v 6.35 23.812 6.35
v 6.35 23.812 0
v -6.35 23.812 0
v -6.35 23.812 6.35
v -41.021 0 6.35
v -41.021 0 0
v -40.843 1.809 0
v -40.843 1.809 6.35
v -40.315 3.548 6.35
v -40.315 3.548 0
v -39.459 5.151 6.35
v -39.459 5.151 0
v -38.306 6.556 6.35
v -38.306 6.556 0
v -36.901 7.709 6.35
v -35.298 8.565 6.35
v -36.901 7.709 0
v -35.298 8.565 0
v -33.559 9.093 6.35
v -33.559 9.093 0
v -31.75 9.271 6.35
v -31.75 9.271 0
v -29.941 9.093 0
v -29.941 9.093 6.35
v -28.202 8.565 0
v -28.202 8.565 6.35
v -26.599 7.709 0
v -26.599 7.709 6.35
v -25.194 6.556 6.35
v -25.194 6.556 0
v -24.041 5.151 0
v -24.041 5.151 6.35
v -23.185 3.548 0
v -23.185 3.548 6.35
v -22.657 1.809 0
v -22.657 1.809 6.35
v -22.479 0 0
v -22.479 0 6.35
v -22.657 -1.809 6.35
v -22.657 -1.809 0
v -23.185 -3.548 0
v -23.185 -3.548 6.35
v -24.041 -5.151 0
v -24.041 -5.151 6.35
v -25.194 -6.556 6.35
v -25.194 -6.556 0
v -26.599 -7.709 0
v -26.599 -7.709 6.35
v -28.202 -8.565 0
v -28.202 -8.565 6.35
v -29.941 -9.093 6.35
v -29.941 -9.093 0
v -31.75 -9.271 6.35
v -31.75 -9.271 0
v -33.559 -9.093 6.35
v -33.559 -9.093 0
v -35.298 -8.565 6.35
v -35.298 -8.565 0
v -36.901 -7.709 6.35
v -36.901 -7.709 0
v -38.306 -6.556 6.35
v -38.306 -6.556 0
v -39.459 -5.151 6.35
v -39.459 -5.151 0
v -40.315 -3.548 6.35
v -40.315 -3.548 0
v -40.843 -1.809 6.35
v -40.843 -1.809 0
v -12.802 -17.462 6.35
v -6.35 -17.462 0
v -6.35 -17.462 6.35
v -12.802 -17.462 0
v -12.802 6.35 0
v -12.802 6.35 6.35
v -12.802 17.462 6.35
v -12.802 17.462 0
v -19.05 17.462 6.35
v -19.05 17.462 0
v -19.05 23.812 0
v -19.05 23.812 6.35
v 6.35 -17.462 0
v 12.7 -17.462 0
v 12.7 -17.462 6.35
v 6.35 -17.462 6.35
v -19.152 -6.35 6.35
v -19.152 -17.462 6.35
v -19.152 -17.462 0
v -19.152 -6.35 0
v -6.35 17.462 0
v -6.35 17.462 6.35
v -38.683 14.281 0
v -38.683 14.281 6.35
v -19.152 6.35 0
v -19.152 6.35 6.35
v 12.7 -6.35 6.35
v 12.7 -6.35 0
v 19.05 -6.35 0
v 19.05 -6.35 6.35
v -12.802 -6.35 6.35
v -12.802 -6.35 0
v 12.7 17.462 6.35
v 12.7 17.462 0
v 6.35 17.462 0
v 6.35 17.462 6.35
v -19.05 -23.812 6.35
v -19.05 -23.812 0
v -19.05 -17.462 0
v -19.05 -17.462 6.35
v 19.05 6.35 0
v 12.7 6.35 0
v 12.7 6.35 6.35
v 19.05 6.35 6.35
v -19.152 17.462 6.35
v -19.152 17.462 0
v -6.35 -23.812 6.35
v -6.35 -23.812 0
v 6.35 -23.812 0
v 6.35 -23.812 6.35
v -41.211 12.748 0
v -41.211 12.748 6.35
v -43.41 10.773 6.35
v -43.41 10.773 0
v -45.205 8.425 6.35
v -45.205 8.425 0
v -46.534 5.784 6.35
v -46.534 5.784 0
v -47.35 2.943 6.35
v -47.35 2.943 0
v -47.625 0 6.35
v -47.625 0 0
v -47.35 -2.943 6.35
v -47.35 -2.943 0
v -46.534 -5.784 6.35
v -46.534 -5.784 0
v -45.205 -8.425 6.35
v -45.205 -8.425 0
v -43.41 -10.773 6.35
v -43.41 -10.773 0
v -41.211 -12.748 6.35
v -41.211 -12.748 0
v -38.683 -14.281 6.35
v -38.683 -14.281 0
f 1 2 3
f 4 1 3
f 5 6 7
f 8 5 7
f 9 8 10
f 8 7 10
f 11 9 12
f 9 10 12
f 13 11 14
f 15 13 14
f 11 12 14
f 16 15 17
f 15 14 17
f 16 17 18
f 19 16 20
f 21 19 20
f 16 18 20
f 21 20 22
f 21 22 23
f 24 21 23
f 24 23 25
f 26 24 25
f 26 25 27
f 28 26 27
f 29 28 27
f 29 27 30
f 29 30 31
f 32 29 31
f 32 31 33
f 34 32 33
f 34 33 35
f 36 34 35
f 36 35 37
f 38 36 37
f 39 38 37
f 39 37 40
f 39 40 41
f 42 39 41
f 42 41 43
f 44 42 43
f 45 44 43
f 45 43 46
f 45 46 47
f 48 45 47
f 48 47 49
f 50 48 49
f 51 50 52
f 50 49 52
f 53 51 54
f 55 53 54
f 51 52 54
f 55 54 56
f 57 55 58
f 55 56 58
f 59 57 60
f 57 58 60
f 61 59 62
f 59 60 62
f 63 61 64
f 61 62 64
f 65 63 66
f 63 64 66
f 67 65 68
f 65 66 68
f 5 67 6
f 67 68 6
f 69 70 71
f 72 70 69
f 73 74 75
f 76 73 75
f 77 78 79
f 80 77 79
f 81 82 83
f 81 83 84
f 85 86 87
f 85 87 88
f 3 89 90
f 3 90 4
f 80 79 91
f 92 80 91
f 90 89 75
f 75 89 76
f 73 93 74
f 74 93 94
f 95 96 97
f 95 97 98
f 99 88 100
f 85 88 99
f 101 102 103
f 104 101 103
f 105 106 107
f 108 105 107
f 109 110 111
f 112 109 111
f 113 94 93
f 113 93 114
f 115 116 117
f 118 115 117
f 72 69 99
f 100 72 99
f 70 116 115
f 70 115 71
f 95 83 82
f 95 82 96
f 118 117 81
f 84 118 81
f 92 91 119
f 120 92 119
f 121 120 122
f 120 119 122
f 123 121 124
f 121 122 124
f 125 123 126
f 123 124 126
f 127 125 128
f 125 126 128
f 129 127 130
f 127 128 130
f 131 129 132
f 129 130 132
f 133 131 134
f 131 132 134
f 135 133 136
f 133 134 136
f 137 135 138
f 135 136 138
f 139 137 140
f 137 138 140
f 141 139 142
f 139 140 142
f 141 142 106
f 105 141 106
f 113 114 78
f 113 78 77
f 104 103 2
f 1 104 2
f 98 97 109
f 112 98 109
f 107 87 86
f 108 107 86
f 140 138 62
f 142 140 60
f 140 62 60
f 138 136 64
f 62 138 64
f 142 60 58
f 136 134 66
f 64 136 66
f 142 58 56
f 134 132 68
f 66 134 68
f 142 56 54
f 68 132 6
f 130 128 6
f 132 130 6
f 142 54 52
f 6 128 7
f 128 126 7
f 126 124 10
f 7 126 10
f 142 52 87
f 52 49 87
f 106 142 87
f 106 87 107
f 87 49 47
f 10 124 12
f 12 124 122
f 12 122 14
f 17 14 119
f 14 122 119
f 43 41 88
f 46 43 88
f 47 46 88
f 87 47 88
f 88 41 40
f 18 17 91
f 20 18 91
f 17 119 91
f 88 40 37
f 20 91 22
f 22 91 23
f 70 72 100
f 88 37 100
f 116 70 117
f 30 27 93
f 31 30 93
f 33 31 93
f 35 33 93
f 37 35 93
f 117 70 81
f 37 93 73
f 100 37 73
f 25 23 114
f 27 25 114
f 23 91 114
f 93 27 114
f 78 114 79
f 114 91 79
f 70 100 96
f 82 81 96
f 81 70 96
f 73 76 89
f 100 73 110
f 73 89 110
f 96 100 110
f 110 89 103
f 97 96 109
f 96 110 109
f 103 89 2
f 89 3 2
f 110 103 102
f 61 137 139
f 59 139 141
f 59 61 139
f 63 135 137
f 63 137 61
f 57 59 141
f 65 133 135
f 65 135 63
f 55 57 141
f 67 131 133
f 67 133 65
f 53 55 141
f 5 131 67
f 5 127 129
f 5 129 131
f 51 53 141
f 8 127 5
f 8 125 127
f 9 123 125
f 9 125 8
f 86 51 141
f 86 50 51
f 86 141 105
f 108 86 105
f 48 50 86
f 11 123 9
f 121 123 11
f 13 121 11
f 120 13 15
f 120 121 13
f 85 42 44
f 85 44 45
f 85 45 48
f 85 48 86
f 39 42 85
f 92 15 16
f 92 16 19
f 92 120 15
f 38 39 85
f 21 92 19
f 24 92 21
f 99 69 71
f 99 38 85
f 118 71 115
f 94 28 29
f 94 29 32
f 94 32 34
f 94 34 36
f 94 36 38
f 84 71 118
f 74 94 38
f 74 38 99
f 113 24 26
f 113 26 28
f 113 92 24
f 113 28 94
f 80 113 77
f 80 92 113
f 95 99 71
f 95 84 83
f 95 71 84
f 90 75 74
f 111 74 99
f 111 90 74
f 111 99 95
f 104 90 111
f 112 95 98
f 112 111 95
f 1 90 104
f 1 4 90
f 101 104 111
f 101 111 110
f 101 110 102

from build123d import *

# Parameters (mm, degrees)
MASS_DEPTH          = 6.35
SKETCH4_R           = 9.271
CUT_EXTRUDE1_DEPTH  = 54.623672769
SKETCH3_W           = 12.7
SKETCH3_H           = 12.7
CUT_EXTRUDE2_DEPTH  = 54.623672769
LPATTERN1_COUNT     = 2
LPATTERN1_PITCH     = 25.4
CAVITY1_START       = -19.1516
CAVITY1_OUTLINE_W   = 11.1125
CAVITY1_OUTLINE_H   = 6.35
CAVITY1_DEPTH       = 6.35
CAVITY1_START_2     = 12.7
CAVITY1_2_OUTLINE_W = 11.1125
CAVITY1_2_OUTLINE_H = 6.35
CAVITY1_2_DEPTH     = 6.35


# Read off the part's stored shape, not the designer's step: Cavity1
with BuildPart() as part:
    # Sketch1 → Mass (new body)
    with BuildSketch(Plane.XY):
        with BuildLine():
            Line((-19.05, -23.8125), (19.05, -23.8125))
            Line((19.05, -23.8125), (19.05, 23.8125))
            Line((19.05, 23.8125), (-19.05, 23.8125))
            Line((-19.05, 23.8125), (-38.68314018, 14.281008096))
            ThreePointArc((-38.68314018, 14.281008096), (-47.625, 0), (-38.68314018, -14.281008096))
            Line((-38.68314018, -14.281008096), (-19.05, -23.8125))
        make_face()
    extrude(amount=MASS_DEPTH)

    # Sketch4 → Cut-Extrude1 (cut, through all)
    with BuildSketch(Plane(origin=(0, 0, 0), x_dir=(-1, 0, 0), z_dir=(0, 0, -1))):
        with Locations((31.75, 0)):
            Circle(SKETCH4_R)
    extrude(amount=-CUT_EXTRUDE1_DEPTH, mode=Mode.SUBTRACT)

    # Sketch3 → Cut-Extrude2 (cut, through all)
    with BuildSketch(Plane(origin=(0, 0, 0), x_dir=(-1, 0, 0), z_dir=(0, 0, -1))):
        with Locations((-12.7, 23.8125)):
            Rectangle(SKETCH3_W, SKETCH3_H)
        with Locations((-12.7, -23.8125)):
            Rectangle(SKETCH3_W, SKETCH3_H)
    cut_extrude2 = extrude(amount=-CUT_EXTRUDE2_DEPTH, mode=Mode.SUBTRACT)

    # LPattern1: Cut-Extrude2 ×2
    with Locations(*[(-i * LPATTERN1_PITCH, 0, 0) for i in range(1, LPATTERN1_COUNT)]):
        add(cut_extrude2, mode=Mode.SUBTRACT)

    # Cavity1 outline → Cavity1 (cut)
    with BuildSketch(Plane.YZ.offset(CAVITY1_START)):
        with Locations((-11.90625, 3.175)):
            Rectangle(CAVITY1_OUTLINE_W, CAVITY1_OUTLINE_H)
        with Locations((11.90625, 3.175)):
            Rectangle(CAVITY1_OUTLINE_W, CAVITY1_OUTLINE_H)
    extrude(amount=CAVITY1_DEPTH, mode=Mode.SUBTRACT)

    # Cavity1 2 outline → Cavity1 2 (cut)
    with BuildSketch(Plane.YZ.offset(CAVITY1_START_2)):
        with Locations((-11.90625, 3.175)):
            Rectangle(CAVITY1_2_OUTLINE_W, CAVITY1_2_OUTLINE_H)
        with Locations((11.90625, 3.175)):
            Rectangle(CAVITY1_2_OUTLINE_W, CAVITY1_2_OUTLINE_H)
    extrude(amount=CAVITY1_2_DEPTH, mode=Mode.SUBTRACT)


solid = part.part
